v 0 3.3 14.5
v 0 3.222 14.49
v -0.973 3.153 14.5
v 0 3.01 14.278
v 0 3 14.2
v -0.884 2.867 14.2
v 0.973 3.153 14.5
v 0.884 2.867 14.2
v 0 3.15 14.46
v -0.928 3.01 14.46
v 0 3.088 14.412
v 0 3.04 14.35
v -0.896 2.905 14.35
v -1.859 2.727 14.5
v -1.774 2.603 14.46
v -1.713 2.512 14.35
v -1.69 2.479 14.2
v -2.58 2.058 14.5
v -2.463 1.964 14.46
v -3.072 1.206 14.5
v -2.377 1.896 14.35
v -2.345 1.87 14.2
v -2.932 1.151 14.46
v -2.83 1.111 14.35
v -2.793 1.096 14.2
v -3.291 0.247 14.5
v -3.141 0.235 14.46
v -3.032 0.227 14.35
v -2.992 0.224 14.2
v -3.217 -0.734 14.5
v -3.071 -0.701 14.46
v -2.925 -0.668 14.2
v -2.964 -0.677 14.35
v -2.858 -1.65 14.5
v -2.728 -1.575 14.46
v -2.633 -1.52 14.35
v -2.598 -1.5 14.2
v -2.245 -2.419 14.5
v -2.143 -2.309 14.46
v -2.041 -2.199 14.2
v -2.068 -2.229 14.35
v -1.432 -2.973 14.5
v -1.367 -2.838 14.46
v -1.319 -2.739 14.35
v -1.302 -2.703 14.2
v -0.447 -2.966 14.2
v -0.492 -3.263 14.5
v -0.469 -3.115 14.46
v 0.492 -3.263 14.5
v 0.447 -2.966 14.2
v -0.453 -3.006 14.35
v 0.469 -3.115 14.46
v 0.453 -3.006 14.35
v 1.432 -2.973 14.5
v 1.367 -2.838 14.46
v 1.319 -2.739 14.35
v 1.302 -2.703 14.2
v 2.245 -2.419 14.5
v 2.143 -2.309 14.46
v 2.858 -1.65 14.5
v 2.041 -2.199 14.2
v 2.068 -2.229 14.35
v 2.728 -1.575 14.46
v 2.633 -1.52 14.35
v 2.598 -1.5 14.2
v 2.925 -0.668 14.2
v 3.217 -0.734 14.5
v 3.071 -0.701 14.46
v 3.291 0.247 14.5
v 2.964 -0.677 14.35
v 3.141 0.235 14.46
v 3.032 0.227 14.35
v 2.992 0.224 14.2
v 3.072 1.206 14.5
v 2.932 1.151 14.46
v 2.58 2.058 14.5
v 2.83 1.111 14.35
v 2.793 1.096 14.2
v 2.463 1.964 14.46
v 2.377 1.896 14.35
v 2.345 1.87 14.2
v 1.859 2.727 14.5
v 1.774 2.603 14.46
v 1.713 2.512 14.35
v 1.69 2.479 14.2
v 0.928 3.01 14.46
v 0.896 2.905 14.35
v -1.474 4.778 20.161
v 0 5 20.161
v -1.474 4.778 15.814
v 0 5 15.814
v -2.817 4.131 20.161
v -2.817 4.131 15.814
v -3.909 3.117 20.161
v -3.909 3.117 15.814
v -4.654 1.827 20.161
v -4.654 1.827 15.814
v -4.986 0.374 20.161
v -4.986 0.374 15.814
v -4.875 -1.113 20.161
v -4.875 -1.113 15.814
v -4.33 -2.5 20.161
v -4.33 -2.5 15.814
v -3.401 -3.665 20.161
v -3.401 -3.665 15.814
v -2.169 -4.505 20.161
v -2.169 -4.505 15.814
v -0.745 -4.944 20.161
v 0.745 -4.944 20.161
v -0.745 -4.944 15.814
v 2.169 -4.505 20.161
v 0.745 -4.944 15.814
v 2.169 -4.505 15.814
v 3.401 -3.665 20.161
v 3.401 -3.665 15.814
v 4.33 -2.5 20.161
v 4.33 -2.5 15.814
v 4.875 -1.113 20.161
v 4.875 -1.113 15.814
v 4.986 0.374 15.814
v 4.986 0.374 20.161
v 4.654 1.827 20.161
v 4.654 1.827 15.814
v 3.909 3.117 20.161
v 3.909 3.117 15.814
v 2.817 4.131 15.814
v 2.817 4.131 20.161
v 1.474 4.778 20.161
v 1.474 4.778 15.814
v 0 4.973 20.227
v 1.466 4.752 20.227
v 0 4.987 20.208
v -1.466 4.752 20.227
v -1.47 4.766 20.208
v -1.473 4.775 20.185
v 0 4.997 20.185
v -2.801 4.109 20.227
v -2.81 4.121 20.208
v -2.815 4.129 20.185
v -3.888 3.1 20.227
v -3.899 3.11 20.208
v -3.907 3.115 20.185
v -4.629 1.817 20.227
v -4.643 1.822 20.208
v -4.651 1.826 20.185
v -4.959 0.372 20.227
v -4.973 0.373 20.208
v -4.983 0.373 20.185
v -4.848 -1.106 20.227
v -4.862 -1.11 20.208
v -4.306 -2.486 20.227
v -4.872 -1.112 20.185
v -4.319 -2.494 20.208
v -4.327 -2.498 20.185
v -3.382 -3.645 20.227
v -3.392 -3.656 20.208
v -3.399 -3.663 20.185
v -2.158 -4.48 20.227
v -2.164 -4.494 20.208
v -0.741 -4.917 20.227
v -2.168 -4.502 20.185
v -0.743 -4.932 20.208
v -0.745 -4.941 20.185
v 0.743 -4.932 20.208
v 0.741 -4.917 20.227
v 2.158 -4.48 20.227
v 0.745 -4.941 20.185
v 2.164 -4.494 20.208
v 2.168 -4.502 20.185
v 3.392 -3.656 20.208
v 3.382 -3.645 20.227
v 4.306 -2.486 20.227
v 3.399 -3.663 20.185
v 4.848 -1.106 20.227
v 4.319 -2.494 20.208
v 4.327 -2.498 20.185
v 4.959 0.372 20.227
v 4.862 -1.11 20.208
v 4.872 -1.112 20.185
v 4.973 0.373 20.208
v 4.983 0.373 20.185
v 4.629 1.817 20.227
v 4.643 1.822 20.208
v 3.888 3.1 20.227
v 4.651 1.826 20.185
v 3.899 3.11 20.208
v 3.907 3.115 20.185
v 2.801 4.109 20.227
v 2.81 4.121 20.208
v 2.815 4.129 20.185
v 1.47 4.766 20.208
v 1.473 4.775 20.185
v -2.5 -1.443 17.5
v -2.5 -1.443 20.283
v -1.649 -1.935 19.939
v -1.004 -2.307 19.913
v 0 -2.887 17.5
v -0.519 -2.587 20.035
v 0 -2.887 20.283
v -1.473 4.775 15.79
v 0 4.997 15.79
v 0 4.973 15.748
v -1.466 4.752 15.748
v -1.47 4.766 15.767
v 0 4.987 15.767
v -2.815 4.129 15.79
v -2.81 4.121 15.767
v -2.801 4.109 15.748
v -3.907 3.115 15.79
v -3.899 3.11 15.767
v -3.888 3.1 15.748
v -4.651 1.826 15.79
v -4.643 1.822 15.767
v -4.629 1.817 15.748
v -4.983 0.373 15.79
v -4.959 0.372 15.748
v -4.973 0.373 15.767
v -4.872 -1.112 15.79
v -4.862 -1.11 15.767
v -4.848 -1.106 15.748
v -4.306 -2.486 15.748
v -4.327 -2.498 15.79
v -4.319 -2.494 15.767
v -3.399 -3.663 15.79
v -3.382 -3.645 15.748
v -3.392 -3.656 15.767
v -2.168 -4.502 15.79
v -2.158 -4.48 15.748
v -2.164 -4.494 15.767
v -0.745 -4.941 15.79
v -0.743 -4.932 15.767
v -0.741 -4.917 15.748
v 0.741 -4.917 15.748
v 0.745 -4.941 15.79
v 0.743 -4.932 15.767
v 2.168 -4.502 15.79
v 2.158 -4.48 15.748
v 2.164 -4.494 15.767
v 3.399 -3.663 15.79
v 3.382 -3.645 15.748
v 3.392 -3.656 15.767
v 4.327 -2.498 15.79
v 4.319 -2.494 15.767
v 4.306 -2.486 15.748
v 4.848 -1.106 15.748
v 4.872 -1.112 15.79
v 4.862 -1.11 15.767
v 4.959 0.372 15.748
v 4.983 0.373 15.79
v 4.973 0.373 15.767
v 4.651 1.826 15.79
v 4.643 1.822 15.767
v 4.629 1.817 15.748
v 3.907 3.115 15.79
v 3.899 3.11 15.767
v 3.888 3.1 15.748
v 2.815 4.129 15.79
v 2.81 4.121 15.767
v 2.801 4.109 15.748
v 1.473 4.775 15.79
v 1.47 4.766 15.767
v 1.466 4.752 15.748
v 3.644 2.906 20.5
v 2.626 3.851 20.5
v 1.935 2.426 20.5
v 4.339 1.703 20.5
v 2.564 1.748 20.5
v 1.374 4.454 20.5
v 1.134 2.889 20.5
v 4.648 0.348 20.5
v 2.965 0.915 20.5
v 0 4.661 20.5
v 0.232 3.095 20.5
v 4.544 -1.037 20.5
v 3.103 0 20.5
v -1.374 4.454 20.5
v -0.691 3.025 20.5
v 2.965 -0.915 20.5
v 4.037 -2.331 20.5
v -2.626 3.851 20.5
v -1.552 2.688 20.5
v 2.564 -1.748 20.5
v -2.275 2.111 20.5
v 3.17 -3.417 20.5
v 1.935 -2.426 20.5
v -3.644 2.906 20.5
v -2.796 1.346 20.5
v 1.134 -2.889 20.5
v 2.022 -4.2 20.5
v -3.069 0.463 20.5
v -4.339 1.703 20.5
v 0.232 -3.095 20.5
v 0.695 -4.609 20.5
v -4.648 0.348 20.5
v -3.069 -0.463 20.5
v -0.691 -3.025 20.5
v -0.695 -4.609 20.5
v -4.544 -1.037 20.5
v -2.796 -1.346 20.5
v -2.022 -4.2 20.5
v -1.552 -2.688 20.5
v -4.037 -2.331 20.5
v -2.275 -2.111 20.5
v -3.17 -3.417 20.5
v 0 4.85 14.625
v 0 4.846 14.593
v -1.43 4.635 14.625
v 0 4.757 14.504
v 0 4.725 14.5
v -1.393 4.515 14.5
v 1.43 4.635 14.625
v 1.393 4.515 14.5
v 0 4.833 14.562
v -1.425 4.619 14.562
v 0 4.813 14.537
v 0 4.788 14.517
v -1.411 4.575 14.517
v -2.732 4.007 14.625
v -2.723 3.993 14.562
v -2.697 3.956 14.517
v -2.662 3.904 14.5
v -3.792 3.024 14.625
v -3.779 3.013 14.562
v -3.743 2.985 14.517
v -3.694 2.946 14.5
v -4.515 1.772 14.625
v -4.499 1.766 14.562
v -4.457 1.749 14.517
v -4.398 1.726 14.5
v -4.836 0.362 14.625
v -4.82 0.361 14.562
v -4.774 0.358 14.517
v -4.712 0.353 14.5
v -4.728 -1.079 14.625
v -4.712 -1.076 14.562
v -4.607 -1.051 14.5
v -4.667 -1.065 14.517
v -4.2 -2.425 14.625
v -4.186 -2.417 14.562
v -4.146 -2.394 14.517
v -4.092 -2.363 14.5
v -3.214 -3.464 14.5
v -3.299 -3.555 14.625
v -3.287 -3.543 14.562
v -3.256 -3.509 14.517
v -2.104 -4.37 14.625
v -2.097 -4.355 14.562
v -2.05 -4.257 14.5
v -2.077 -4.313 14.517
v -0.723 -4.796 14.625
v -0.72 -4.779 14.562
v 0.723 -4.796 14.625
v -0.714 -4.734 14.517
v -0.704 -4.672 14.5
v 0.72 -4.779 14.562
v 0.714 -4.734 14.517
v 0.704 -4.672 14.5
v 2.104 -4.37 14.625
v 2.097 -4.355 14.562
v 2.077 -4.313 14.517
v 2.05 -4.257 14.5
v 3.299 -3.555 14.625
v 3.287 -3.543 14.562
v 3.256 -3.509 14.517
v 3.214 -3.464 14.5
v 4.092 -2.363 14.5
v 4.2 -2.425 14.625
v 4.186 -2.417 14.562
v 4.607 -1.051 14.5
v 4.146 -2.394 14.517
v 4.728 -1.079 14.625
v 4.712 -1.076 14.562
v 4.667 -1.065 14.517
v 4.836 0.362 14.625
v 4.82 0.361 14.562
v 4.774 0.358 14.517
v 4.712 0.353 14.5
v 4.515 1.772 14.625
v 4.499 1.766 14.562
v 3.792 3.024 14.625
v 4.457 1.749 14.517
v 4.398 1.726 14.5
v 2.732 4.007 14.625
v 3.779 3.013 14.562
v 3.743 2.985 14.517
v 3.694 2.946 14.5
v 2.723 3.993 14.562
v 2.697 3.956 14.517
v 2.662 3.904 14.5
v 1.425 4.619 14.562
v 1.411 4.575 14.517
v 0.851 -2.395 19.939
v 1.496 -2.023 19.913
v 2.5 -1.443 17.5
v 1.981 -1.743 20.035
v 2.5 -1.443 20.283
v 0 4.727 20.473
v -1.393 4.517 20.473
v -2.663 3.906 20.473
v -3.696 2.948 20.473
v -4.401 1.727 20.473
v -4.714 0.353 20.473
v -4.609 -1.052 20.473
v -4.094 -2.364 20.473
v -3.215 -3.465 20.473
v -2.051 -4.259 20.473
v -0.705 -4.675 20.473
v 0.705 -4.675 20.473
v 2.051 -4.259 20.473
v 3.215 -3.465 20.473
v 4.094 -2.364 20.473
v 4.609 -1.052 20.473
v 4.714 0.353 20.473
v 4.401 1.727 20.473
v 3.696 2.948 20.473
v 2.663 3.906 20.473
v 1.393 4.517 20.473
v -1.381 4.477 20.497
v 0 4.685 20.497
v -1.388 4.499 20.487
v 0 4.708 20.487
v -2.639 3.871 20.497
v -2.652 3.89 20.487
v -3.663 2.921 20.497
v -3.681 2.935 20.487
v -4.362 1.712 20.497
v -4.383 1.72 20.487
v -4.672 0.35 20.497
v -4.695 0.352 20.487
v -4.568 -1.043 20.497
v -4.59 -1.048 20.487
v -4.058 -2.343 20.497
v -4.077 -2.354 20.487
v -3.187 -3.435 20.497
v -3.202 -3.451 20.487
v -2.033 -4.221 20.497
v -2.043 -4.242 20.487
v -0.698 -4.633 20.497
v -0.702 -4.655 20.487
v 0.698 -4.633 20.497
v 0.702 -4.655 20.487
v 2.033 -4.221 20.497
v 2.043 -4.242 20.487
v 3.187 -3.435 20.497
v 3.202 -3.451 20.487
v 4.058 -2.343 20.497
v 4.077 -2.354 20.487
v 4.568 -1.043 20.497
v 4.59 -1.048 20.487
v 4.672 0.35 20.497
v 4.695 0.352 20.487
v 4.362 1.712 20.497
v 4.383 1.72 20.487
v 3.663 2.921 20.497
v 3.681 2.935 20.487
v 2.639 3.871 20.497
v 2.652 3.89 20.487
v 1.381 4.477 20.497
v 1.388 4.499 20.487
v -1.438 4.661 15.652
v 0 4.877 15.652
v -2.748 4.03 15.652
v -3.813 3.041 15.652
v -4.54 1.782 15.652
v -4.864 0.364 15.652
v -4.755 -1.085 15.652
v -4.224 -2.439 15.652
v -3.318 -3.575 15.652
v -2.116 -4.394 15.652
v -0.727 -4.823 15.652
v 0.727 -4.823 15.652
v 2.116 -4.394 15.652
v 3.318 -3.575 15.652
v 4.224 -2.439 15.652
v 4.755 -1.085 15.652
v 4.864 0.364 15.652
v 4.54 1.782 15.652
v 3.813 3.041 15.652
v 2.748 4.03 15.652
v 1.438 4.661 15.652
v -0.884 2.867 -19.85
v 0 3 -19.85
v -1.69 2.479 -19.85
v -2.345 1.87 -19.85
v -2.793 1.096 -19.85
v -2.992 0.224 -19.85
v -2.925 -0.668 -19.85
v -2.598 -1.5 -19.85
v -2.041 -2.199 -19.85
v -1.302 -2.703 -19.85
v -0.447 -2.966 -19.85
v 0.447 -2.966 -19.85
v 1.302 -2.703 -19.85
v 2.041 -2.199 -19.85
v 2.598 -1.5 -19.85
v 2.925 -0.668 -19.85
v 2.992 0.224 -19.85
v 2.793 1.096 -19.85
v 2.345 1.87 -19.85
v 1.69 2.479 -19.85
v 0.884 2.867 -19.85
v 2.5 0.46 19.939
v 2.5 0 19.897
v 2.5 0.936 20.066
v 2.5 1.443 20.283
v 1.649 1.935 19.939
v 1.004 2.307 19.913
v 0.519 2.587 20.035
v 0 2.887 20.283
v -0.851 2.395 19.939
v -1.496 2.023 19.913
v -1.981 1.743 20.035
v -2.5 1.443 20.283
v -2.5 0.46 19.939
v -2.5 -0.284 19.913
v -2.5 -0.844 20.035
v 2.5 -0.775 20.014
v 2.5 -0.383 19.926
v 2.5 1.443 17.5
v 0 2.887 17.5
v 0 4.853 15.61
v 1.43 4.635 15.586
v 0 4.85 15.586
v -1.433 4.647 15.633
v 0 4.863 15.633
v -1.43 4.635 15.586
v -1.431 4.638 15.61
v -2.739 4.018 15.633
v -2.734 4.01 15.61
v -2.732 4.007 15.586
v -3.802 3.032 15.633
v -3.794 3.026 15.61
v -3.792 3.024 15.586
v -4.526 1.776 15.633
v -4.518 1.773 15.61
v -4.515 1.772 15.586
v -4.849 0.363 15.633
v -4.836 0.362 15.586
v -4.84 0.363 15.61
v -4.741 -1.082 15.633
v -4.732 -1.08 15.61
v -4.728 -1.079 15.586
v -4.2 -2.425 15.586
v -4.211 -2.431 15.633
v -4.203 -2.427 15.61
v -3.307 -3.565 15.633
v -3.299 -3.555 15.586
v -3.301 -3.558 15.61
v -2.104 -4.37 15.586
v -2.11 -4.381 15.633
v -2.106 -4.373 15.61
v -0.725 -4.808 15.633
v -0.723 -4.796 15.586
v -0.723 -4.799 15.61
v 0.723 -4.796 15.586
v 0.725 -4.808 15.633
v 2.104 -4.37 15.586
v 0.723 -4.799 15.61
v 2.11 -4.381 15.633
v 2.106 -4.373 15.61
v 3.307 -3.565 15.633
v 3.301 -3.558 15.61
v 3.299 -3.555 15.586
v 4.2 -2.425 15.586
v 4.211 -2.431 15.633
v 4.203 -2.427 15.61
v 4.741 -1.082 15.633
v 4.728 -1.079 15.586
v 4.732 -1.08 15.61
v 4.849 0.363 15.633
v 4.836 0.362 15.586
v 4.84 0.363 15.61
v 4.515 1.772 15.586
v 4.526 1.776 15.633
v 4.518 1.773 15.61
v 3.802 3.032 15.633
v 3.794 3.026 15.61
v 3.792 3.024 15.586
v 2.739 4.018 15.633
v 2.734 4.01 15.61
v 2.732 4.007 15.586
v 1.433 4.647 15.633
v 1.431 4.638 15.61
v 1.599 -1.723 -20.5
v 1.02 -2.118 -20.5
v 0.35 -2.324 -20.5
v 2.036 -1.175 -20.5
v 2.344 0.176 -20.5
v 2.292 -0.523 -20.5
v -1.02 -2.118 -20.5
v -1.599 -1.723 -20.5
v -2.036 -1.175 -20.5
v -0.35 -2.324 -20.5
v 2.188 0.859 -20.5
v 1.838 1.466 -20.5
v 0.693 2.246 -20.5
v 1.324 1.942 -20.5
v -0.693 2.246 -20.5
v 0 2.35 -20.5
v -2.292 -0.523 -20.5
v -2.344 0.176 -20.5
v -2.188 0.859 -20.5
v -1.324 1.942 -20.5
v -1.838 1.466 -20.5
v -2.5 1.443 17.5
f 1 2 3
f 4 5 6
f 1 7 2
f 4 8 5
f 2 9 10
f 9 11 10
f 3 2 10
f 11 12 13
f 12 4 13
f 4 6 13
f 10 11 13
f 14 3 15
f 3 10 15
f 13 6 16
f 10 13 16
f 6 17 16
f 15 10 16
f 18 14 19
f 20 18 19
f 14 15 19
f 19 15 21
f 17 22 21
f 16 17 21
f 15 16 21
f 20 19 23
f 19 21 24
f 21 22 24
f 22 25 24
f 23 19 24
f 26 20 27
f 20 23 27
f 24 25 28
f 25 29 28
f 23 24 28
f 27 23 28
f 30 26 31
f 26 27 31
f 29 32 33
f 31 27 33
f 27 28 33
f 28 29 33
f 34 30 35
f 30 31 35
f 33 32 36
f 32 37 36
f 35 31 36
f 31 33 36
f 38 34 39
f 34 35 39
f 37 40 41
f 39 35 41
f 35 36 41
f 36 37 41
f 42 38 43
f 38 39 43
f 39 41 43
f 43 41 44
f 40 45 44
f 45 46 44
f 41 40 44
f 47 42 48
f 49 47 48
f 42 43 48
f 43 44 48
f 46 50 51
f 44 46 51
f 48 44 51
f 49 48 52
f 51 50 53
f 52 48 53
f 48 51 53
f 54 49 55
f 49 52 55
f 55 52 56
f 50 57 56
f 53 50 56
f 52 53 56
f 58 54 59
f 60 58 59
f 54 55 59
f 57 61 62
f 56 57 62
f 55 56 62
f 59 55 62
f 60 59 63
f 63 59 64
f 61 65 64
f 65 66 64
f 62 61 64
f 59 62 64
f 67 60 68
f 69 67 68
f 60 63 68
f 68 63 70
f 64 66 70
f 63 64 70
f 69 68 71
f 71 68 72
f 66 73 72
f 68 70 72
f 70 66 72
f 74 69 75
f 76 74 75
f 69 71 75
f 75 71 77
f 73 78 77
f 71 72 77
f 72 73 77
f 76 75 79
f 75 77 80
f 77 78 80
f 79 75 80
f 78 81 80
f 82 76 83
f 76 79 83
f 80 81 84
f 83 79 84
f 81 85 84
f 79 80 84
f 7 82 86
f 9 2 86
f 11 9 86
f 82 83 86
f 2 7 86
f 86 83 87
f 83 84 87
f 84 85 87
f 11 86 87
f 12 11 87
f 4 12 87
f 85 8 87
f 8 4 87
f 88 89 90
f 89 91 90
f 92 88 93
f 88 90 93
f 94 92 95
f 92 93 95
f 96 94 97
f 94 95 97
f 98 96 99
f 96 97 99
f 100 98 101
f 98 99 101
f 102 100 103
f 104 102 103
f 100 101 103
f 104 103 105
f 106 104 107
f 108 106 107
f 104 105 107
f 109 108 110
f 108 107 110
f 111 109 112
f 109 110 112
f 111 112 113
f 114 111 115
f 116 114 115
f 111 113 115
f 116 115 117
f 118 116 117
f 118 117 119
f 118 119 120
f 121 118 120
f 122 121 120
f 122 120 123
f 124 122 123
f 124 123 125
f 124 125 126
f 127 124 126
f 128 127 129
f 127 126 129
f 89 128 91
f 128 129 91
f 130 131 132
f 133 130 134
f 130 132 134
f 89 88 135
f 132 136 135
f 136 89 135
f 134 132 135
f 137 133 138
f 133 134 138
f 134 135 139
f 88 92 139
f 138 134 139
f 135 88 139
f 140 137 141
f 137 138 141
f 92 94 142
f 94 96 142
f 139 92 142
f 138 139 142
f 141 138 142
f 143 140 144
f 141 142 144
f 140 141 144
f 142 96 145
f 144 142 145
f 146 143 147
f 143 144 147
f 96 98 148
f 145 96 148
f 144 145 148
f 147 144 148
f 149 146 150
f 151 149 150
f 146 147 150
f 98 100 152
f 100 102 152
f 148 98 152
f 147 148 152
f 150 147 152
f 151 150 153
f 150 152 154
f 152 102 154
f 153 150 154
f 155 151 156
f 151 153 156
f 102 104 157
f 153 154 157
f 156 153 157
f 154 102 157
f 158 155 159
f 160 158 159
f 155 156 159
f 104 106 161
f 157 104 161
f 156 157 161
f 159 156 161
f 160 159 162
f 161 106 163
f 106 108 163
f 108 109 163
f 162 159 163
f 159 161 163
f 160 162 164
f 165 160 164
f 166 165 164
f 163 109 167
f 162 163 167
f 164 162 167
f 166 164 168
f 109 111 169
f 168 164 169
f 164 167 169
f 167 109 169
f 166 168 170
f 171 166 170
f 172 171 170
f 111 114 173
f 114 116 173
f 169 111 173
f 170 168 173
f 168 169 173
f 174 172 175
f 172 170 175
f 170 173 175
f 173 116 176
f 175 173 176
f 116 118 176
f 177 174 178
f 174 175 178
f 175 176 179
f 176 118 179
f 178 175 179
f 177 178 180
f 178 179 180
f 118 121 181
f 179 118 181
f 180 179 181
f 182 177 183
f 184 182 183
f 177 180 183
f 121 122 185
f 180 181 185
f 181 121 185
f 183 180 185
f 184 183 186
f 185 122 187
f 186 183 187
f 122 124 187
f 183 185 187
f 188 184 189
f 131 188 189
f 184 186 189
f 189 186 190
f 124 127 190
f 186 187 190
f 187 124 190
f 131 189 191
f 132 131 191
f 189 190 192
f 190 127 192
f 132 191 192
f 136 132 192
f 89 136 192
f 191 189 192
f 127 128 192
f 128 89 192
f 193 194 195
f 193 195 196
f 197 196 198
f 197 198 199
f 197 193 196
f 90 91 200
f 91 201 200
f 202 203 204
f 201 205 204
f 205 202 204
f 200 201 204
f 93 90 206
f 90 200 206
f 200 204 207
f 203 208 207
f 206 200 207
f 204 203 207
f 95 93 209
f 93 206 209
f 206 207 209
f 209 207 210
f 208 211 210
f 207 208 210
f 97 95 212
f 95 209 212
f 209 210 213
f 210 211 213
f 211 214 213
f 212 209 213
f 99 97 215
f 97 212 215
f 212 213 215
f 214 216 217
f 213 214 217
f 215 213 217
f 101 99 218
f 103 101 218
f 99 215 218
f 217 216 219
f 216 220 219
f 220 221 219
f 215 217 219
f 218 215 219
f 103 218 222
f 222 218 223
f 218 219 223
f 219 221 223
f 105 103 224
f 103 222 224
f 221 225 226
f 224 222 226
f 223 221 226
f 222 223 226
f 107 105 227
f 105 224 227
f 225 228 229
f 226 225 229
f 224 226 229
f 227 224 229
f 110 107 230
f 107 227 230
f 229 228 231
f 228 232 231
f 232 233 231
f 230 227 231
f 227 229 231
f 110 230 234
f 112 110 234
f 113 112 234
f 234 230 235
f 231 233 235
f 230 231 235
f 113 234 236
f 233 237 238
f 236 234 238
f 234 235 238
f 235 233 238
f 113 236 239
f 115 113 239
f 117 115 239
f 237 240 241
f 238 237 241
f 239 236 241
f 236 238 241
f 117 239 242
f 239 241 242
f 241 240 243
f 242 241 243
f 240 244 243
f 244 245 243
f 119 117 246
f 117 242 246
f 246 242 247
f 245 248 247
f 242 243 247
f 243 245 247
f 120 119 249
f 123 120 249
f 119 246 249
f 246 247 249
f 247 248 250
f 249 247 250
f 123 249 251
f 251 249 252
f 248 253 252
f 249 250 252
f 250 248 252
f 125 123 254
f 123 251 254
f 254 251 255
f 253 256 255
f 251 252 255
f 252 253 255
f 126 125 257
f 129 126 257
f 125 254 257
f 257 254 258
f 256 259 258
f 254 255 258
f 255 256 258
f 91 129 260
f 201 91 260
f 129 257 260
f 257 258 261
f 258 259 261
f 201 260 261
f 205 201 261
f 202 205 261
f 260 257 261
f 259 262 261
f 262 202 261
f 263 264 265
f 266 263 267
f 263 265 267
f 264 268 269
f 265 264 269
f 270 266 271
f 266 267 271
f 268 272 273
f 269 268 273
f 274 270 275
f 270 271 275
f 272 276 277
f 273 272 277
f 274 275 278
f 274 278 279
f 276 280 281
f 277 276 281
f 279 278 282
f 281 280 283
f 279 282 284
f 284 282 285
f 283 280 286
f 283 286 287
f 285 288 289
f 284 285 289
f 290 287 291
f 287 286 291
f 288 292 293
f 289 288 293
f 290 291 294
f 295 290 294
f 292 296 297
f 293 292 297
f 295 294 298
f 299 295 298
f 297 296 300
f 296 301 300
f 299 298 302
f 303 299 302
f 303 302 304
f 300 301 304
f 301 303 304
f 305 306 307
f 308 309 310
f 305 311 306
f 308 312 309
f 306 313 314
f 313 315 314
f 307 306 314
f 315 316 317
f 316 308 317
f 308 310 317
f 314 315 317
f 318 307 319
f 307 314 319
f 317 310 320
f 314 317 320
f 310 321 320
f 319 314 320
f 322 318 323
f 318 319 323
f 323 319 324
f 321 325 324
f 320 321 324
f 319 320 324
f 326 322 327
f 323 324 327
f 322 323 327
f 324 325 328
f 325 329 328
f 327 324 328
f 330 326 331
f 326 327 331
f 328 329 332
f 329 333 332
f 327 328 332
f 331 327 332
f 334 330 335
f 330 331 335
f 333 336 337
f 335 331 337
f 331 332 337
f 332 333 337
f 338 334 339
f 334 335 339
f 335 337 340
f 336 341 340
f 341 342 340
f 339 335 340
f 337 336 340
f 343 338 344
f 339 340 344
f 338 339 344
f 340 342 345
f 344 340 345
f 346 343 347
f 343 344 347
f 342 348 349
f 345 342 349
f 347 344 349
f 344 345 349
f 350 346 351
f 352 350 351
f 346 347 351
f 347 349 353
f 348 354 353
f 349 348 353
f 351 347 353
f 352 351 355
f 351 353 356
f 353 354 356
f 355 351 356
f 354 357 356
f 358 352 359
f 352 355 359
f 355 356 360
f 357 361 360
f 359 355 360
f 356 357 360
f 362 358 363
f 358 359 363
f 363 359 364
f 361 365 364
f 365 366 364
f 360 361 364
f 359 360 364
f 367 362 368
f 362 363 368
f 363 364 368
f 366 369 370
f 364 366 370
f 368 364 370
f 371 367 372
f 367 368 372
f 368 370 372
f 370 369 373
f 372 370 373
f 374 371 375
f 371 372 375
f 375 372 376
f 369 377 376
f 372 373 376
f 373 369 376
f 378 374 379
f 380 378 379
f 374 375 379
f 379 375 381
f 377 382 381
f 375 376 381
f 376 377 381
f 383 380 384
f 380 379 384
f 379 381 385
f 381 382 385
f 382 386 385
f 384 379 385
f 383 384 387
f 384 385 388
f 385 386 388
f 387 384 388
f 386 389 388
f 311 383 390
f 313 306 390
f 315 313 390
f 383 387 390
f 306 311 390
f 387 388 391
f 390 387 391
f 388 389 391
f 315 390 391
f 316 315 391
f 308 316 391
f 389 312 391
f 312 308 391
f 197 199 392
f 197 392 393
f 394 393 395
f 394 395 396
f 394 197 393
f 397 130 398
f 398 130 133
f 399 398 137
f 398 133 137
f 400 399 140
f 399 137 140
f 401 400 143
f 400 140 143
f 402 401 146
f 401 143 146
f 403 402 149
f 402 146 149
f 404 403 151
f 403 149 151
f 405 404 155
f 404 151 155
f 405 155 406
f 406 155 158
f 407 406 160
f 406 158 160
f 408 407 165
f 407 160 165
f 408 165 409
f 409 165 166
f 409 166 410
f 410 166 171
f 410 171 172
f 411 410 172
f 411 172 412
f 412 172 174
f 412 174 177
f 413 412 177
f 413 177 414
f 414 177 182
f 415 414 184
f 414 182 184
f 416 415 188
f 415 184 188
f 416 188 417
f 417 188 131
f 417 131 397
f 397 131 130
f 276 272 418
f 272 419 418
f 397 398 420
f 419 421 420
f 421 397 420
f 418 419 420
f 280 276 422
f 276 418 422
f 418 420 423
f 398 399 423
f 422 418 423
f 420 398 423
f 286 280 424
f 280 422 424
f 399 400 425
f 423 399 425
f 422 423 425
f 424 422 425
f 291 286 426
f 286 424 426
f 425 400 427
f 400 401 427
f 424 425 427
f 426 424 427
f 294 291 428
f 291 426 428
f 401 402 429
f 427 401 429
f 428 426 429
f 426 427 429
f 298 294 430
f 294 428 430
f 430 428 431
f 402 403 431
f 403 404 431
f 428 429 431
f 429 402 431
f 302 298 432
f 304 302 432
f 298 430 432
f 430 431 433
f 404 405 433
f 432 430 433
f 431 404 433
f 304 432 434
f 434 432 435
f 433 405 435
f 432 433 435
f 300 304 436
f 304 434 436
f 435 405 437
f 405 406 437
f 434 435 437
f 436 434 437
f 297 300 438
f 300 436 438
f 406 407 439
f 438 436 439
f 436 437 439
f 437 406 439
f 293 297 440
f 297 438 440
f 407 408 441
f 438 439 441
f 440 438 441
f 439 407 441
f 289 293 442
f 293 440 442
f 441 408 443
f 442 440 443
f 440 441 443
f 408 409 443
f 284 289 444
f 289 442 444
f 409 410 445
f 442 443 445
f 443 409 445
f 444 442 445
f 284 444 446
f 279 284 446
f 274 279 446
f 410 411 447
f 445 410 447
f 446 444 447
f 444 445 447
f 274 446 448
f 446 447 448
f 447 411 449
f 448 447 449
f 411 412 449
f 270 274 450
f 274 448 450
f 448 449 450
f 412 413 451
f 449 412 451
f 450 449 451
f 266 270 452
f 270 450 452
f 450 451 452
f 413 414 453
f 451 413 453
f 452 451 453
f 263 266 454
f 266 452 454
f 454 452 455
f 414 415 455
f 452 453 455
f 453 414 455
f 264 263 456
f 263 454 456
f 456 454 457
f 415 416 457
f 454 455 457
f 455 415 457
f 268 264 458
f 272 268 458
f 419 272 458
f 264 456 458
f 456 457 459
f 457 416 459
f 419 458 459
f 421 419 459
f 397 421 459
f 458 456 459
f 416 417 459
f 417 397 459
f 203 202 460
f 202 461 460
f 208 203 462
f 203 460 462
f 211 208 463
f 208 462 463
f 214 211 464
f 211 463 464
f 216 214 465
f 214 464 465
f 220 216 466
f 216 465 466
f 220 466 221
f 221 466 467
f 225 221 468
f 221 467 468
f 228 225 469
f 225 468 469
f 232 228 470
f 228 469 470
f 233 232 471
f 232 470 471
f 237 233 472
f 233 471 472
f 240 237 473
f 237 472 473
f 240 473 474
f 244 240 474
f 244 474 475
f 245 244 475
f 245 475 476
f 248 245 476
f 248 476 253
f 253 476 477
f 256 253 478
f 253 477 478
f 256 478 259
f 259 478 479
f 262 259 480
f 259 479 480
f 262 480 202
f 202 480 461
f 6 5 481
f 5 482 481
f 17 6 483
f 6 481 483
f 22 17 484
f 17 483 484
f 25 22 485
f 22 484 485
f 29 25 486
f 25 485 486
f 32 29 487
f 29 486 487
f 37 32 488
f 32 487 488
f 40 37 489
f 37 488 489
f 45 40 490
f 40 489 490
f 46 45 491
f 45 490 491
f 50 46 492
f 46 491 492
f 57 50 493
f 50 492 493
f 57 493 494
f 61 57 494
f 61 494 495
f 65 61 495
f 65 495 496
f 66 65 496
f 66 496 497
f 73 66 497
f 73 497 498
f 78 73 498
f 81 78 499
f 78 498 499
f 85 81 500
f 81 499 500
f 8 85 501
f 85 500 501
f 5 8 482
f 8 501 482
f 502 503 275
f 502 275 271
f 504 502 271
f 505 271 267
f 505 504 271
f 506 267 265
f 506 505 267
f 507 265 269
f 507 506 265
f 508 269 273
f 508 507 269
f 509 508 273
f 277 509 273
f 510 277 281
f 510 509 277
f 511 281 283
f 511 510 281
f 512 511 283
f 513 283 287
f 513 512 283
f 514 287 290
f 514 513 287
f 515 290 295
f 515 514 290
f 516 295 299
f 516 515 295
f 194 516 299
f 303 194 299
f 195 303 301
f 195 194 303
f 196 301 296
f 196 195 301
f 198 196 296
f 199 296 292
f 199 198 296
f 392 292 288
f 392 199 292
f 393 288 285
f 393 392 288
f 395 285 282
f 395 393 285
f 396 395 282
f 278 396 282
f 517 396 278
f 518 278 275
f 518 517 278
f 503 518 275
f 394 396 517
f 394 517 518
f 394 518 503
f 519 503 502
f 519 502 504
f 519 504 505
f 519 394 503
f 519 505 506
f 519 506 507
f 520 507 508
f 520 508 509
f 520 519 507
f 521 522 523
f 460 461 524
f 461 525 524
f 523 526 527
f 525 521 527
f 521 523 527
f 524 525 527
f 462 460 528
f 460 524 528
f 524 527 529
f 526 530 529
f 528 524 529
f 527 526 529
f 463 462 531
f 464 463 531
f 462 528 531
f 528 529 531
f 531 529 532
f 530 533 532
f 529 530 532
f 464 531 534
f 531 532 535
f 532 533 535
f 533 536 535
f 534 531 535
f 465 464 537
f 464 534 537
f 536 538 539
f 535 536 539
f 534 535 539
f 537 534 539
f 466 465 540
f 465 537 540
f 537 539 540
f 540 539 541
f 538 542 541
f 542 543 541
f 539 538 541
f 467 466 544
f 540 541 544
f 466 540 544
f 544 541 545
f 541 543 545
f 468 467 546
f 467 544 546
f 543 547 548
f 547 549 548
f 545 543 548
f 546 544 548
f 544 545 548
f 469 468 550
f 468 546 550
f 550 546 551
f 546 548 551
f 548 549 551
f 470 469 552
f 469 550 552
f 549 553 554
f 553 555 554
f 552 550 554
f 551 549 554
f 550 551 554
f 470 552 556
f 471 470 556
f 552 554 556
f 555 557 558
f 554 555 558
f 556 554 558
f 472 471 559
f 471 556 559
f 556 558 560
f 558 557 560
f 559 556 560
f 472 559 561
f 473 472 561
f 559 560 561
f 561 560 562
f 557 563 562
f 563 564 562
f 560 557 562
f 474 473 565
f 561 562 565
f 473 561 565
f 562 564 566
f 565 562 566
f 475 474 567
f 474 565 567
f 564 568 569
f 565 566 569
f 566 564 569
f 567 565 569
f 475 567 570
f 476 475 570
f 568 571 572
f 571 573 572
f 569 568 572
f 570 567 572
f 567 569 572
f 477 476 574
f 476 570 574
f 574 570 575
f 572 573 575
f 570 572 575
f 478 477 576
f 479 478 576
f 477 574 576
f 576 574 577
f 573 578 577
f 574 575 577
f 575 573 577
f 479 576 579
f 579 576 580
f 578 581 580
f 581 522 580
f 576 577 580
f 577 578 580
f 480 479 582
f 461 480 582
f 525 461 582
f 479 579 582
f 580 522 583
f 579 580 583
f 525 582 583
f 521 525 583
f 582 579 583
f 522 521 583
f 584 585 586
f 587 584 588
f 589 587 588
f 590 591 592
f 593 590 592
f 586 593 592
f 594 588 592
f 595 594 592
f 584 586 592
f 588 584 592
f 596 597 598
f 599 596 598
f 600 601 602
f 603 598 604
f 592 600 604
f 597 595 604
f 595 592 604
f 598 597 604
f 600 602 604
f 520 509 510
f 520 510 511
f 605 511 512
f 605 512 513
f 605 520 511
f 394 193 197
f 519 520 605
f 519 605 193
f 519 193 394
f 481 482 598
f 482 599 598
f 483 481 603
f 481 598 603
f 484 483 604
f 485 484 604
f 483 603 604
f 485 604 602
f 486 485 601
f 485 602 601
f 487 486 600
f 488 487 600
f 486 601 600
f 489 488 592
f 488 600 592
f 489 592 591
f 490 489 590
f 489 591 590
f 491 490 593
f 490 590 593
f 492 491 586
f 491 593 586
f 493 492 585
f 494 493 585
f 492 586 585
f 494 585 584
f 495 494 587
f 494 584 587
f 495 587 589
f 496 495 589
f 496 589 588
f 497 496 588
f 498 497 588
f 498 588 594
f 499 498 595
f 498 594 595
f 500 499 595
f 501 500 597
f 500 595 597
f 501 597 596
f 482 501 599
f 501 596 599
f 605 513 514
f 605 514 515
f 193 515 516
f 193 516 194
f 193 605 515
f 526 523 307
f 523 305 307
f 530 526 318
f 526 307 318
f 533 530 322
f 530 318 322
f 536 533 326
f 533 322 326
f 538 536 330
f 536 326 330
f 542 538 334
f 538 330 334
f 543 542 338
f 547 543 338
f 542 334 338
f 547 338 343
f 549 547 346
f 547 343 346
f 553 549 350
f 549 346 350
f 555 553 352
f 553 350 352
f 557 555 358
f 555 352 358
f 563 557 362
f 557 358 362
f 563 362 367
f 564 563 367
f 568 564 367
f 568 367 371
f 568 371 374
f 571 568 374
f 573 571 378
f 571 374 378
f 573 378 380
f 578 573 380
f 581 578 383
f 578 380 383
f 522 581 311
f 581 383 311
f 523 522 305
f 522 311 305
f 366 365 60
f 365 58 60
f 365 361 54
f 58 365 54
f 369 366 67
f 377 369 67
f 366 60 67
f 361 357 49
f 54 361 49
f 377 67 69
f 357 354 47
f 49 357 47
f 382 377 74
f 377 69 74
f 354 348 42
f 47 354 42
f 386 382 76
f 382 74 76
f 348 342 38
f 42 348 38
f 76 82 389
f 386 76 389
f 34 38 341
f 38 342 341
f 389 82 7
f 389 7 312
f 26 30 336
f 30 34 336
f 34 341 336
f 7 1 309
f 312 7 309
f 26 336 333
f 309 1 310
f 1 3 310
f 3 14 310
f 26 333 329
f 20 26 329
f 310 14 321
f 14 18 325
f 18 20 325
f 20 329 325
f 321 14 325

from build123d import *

# Parameters (mm, degrees)
CUT_EXTRUDE1_START = -3
CUT_EXTRUDE1_DEPTH = 3
SKETCH4_R          = 3.103257697
CUT_EXTRUDE2_DEPTH = 3
CUT_EXTRUDE2_TAPER = 45


with BuildPart() as part:
    # Sketch2 → Revolve1 (revolve)
    with BuildSketch(Plane(origin=(0, 0, 0), x_dir=(0, 0, -1), z_dir=(1, 0, 0))):
        with BuildLine():
            Line((-20.5, 0), (-20.5, 4.661167479))
            ThreePointArc((-20.5, 4.661167479), (-20.492863706, 4.69704405), (-20.472541261, 4.727458739))
            Line((-20.472541261, 4.727458739), (-20.227458739, 4.972541261))
            ThreePointArc((-20.227458739, 4.972541261), (-20.19704405, 4.992863706), (-20.161167479, 5))
            Line((-20.161167479, 5), (-15.813832521, 5))
            ThreePointArc((-15.813832521, 5), (-15.77795595, 4.992863706), (-15.747541261, 4.972541261))
            Line((-15.747541261, 4.972541261), (-15.652458739, 4.877458739))
            ThreePointArc((-15.652458739, 4.877458739), (-15.62204405, 4.857136294), (-15.586167479, 4.85))
            Line((-15.586167479, 4.85), (-14.625, 4.85))
            ThreePointArc((-14.625, 4.85), (-14.536611652, 4.813388348), (-14.5, 4.725))
            Line((-14.5, 4.725), (-14.5, 3.3))
            ThreePointArc((-14.5, 3.3), (-14.412132034, 3.087867966), (-14.2, 3))
            Line((-14.2, 3), (19.850480947, 3))
            Line((19.850480947, 3), (20.5, 2.350480947))
            Line((20.5, 2.350480947), (20.5, 0))
            Line((20.5, 0), (-20.5, 0))
        make_face()
    revolve(axis=Axis((0, 0, -20.5), (0, 0, 1)))

    # Sketch3 → Cut-Extrude1 (cut)
    with BuildSketch(Plane.XY.offset(20.5).offset(CUT_EXTRUDE1_START)):
        Polygon((2.5, -1.443375673), (2.5, 1.443375673), (0, 2.886751346), (-2.5, 1.443375673), (-2.5, -1.443375673), (0, -2.886751346), align=None)
    extrude(amount=CUT_EXTRUDE1_DEPTH, mode=Mode.SUBTRACT)

    # Sketch4 → Cut-Extrude2 (cut)
    with BuildSketch(Plane.XY.offset(20.5)):
        Circle(SKETCH4_R)
    extrude(amount=-CUT_EXTRUDE2_DEPTH, taper=CUT_EXTRUDE2_TAPER, mode=Mode.SUBTRACT)


solid = part.part
